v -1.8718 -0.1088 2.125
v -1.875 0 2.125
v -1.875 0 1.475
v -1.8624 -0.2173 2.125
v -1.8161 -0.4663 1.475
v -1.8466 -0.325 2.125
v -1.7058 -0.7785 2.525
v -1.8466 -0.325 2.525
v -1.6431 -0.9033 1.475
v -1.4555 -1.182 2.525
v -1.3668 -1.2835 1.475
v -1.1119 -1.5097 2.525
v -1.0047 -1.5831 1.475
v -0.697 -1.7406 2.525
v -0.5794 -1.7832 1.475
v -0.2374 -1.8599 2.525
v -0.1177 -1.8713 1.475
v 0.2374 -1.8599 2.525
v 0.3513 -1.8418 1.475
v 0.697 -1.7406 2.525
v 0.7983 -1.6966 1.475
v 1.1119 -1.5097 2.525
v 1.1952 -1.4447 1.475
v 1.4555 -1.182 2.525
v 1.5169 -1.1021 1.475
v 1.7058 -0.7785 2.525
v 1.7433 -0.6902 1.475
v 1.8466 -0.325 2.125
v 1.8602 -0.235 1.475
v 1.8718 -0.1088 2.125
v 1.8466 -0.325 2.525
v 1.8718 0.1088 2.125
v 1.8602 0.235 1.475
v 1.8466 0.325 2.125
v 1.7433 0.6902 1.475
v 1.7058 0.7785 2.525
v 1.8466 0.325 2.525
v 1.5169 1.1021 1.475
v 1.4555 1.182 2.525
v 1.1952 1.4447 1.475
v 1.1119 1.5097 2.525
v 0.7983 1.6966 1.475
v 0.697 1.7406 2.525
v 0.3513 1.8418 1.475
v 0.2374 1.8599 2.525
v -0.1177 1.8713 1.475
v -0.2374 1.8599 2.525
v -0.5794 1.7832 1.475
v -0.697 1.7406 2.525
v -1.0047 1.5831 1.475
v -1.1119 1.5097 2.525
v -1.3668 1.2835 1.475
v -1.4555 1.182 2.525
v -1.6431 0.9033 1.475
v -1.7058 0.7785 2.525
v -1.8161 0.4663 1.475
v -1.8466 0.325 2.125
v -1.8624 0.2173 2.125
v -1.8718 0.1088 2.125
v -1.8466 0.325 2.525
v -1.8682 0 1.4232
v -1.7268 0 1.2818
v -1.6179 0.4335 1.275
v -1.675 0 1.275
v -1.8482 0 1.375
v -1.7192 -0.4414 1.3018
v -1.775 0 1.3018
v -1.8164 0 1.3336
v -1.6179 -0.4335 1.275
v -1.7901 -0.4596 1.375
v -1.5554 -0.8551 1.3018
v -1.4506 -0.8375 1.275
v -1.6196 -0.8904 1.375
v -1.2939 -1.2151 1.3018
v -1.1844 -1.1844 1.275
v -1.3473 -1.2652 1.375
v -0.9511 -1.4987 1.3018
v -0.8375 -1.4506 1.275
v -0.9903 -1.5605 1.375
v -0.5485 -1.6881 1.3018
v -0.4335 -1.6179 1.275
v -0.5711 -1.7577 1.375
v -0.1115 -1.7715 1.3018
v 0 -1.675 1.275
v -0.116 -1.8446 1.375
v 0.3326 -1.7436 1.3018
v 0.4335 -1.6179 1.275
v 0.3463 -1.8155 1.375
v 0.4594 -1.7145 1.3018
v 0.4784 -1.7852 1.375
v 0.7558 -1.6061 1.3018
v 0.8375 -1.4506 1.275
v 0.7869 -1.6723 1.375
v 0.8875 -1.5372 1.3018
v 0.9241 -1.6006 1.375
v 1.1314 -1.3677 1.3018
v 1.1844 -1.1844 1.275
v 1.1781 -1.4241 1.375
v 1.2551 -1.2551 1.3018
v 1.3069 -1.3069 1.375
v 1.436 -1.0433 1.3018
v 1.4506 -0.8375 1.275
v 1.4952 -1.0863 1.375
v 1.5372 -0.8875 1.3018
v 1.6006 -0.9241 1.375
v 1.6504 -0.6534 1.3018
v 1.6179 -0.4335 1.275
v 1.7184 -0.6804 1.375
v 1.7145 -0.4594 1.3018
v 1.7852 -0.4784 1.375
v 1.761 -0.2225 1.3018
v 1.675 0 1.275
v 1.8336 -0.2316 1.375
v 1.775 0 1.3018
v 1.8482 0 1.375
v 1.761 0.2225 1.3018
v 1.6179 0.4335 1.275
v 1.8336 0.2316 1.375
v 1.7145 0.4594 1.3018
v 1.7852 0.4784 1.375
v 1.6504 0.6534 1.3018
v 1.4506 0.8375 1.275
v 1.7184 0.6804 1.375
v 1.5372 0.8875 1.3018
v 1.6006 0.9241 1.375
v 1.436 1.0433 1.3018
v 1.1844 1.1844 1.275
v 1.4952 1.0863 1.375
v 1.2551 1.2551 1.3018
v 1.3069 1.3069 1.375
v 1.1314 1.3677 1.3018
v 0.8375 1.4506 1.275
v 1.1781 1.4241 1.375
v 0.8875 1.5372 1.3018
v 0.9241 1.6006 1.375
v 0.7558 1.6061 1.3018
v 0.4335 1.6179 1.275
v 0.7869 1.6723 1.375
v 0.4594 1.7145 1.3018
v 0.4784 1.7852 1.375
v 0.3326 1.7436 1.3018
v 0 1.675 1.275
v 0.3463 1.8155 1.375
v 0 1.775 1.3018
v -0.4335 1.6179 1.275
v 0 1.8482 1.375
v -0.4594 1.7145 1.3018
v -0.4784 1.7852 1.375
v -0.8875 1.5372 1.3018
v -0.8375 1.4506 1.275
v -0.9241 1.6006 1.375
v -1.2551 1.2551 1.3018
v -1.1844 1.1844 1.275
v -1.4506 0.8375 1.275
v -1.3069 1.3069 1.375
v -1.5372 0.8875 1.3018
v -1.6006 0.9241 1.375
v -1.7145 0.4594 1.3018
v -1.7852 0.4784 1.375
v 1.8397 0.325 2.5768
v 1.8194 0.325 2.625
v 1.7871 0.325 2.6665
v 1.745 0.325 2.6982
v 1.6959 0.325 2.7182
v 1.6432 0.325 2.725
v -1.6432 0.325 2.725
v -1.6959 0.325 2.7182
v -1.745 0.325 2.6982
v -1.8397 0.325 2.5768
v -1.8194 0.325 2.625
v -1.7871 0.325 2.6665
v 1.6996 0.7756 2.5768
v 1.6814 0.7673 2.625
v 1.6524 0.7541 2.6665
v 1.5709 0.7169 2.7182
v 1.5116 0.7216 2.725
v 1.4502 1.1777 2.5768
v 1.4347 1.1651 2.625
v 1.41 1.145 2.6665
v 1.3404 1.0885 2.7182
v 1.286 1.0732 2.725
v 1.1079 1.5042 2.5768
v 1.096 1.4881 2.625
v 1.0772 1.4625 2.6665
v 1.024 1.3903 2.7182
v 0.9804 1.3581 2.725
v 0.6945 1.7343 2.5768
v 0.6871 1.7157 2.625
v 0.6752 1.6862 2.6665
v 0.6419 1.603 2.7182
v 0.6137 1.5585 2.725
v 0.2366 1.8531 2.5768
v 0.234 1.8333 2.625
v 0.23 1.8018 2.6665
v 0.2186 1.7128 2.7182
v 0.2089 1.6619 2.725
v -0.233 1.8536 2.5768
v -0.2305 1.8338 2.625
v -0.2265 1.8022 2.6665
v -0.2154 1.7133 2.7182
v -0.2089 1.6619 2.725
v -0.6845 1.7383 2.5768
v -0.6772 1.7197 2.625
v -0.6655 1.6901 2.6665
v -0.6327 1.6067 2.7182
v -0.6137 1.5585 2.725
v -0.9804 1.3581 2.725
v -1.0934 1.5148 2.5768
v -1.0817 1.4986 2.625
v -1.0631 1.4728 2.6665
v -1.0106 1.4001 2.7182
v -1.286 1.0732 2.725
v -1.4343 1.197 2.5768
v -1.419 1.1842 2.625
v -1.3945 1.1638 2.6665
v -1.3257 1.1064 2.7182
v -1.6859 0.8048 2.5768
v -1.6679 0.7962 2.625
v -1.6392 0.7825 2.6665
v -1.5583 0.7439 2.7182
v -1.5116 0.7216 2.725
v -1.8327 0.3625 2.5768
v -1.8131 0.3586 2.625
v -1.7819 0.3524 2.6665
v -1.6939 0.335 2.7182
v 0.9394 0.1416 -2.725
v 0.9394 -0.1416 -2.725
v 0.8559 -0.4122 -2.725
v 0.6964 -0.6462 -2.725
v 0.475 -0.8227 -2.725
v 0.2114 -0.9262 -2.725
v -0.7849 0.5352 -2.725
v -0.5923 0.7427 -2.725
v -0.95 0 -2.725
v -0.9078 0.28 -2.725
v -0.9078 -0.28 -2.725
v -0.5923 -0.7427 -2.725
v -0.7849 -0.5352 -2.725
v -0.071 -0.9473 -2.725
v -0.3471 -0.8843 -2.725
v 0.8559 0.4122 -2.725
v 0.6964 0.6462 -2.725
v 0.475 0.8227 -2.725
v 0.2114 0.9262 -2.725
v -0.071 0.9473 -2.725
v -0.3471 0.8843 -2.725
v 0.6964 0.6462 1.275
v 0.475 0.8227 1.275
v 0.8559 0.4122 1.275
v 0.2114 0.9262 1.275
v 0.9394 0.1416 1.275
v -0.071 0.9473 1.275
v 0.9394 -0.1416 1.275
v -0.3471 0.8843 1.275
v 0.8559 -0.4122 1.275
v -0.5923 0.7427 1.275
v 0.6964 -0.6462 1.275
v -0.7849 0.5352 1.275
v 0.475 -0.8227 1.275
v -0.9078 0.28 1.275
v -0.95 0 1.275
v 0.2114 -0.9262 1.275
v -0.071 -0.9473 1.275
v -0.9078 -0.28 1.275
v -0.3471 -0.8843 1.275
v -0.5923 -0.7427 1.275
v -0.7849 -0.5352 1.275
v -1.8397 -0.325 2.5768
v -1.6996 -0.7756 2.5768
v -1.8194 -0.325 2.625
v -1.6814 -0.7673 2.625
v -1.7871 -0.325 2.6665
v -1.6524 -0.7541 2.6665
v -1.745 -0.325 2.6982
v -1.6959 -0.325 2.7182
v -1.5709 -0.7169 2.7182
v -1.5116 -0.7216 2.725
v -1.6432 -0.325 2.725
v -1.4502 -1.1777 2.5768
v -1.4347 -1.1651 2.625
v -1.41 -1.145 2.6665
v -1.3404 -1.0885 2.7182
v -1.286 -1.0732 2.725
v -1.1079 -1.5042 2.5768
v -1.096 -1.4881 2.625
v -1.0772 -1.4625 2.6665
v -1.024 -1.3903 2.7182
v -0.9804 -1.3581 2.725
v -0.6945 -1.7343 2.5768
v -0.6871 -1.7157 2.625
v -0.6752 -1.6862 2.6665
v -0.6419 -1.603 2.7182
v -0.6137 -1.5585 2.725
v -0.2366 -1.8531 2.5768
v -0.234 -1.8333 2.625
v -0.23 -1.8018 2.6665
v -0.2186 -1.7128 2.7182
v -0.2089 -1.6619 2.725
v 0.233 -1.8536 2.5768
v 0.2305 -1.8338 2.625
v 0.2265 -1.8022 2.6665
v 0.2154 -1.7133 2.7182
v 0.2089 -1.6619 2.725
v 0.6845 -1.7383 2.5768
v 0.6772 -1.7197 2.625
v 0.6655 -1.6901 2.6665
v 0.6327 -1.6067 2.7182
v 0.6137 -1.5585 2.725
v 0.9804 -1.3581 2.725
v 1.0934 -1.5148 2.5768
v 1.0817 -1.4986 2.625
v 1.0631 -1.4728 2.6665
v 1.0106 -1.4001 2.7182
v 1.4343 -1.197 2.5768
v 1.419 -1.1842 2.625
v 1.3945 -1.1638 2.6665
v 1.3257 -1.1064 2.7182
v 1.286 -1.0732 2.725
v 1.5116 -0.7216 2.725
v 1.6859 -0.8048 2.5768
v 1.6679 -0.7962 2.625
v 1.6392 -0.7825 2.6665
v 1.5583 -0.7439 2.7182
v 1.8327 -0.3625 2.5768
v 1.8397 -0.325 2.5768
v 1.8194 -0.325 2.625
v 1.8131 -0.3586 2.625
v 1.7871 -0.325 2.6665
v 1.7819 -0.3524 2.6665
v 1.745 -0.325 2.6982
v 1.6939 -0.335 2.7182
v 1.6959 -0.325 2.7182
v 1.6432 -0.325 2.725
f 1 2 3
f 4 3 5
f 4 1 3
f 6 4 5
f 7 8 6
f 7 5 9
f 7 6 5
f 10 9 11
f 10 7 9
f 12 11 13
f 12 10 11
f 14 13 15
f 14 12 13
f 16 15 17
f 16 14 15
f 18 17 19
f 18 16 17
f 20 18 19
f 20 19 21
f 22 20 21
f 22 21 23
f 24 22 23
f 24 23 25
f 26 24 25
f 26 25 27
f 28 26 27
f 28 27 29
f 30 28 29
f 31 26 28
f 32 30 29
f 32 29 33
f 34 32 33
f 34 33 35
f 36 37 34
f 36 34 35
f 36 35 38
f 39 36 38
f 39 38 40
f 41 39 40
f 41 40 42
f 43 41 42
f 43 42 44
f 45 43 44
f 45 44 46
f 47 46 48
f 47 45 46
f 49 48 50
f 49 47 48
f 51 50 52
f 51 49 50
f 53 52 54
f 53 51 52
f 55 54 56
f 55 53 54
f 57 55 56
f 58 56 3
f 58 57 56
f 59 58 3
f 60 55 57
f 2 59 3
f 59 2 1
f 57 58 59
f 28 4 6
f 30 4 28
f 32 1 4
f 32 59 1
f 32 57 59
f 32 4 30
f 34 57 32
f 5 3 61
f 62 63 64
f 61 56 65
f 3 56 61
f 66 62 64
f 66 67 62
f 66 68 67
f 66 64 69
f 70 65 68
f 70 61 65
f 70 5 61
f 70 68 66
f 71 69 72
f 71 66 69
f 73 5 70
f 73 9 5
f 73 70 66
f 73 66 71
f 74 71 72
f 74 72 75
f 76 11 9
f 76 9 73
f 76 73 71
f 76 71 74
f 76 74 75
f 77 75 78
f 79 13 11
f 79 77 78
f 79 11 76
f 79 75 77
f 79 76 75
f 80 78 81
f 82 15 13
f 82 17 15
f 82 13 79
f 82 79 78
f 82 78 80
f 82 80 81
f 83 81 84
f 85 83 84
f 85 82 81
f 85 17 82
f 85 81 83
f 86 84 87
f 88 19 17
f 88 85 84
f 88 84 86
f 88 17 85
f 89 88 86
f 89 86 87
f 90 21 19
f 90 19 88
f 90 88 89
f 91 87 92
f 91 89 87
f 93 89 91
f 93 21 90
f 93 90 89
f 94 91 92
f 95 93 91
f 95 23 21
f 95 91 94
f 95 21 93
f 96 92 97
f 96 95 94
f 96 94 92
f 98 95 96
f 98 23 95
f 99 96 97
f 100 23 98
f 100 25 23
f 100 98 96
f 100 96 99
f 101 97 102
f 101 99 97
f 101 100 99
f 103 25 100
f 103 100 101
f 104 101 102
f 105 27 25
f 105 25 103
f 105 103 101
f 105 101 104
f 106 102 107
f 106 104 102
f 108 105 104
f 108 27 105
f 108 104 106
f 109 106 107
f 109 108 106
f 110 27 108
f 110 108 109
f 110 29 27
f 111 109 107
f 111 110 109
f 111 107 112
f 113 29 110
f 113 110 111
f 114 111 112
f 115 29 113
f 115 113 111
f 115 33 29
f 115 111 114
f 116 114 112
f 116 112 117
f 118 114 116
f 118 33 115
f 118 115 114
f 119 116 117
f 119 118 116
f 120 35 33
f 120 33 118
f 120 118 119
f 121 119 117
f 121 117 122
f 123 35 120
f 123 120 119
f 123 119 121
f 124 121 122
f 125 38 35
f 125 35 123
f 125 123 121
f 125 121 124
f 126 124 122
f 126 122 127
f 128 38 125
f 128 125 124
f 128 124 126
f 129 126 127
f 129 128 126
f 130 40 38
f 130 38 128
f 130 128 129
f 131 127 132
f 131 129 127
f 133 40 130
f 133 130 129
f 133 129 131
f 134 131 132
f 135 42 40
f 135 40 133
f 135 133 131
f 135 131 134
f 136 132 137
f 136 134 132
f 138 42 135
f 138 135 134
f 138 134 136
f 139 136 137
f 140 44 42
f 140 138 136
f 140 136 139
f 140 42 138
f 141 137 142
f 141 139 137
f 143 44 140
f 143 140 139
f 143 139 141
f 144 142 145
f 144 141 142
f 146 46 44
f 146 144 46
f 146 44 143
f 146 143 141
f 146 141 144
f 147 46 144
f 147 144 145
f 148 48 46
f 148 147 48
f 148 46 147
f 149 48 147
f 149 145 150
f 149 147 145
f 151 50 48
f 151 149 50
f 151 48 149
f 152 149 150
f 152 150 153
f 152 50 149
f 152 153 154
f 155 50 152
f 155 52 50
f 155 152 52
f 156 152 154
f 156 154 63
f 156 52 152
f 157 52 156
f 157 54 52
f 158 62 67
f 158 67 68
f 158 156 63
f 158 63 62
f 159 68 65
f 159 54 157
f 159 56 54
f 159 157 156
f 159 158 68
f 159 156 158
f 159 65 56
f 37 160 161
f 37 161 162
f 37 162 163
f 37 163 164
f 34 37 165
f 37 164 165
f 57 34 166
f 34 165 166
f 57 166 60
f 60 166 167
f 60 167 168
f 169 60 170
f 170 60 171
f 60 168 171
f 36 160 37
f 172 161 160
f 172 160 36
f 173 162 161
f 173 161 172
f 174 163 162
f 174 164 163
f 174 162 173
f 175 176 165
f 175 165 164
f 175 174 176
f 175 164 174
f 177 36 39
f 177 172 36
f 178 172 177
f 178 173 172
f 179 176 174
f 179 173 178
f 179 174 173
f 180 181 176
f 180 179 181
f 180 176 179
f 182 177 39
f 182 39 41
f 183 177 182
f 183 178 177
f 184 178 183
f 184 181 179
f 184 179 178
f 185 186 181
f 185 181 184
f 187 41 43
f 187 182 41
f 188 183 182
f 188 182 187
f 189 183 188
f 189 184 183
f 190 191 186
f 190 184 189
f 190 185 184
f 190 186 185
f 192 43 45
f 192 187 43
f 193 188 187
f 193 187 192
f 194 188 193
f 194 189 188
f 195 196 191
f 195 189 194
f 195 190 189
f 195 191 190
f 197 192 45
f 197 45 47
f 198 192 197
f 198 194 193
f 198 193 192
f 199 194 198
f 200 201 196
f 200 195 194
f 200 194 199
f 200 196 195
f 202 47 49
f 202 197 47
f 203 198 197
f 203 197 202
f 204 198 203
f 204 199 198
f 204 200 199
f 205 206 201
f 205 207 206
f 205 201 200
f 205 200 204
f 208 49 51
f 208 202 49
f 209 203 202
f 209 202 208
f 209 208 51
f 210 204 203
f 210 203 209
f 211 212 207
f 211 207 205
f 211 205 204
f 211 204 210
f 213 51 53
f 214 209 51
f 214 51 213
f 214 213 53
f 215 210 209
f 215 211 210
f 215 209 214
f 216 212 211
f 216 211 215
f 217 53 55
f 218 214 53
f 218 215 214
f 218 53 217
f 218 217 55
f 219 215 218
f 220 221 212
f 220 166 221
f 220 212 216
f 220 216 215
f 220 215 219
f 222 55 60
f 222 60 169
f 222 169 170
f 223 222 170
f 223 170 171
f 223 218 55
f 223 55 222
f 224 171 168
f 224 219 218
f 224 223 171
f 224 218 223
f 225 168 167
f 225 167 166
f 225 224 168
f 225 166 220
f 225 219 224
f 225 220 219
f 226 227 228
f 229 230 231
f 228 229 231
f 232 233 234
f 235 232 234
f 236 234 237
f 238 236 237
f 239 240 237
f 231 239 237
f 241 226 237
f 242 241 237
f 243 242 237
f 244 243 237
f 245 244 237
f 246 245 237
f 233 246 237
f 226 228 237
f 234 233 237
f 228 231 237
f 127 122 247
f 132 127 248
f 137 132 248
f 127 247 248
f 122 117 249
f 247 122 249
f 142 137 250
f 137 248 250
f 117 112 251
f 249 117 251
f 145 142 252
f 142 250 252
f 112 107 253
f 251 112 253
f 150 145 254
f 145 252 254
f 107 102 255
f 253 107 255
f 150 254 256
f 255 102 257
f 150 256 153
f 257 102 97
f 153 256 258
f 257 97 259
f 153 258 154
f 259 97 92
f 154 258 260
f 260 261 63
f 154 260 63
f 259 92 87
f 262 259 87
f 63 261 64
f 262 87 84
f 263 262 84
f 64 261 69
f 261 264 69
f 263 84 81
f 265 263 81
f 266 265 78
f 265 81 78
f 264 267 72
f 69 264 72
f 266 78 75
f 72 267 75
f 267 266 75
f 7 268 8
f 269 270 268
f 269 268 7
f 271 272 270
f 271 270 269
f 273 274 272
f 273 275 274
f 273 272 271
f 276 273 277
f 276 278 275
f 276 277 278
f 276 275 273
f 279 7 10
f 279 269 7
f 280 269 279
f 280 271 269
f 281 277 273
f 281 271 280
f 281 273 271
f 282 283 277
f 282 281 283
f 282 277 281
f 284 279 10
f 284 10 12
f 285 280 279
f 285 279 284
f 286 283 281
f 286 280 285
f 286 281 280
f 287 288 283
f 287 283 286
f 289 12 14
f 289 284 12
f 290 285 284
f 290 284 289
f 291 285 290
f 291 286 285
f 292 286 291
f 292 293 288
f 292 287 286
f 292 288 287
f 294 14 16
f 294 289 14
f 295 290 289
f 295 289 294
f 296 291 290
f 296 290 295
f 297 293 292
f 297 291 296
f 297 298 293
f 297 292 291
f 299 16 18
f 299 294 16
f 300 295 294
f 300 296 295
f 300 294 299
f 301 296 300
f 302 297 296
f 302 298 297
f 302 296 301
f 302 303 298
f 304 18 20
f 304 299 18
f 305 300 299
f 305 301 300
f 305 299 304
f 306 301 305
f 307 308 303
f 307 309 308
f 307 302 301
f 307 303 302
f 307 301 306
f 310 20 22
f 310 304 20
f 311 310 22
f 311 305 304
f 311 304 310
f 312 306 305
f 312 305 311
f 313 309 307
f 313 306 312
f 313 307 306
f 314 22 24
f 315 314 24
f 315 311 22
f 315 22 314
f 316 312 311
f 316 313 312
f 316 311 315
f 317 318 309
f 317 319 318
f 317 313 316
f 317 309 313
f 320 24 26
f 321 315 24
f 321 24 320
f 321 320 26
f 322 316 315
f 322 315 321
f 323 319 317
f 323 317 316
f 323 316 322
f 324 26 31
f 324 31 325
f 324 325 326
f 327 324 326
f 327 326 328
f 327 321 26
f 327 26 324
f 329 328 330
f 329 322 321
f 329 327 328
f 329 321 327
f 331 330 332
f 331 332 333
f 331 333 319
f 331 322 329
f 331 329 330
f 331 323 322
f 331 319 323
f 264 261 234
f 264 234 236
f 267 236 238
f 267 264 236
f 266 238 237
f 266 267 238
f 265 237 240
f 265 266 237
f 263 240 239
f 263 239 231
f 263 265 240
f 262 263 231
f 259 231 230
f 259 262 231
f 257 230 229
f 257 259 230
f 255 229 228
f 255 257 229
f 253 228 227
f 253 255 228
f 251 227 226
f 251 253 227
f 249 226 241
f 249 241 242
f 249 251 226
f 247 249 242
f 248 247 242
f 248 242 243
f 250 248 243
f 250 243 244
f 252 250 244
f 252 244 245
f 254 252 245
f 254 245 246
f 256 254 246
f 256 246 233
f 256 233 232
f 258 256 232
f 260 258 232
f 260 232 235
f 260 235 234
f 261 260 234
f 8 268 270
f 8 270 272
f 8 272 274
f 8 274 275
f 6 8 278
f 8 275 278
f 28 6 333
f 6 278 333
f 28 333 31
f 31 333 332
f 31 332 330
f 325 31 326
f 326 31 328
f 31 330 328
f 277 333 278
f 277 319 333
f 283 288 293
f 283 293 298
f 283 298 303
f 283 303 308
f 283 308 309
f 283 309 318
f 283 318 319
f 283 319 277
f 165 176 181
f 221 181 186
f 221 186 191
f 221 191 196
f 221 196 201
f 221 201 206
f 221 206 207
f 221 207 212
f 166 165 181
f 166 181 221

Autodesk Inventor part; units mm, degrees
ref_plane "YZ Plane" through (0, 0, 0) normal (1, 0, 0) x (0, 1, 0)
ref_plane "XZ Plane" through (0, 0, 0) normal (0, 1, 0) x (-1, 0, 0)
ref_plane "XY Plane" through (0, 0, 0) normal (0, 0, 1) x (1, 0, 0)
sketch "Sketch1" plane through (0, 0, 0) normal (0, 1, 0) x (-1, 0, 0)
  line L0 (0, -3.815) -> (0, 3.815) projected
  line L1 (0, -2.725) -> (0, 2.725)
  line L2 (0, -2.725) -> (0.95, -2.725)
  line L3 (0.95, -2.725) -> (0.95, 1.275)
  line L4 (0.95, 1.275) -> (1.875, 1.275)
  line L5 (1.875, 1.275) -> (1.875, 2.725)
  line L6 (2.25, 0) -> (-0.375, 0) projected
  line L7 (0, 2.725) -> (1.875, 2.725)
  point P0 (0, 0)
  dimension "d0" = 4
  dimension "d1" = 1.9
  dimension "d3" = 3.75
  dimension "d4" = 1.45
revolve "Revolution1" add sketch "Sketch1" angle 360 about axis through (0, 0, -10) along (0, 0, 1)
thread "Thread2" size "M2x0.4" class "6g" standard "ANSI Metric M Profile" full length
fillet "Fillet1" radius 0.2 2 edges at (1.875, 0, 2.725) (1.875, 0, 1.275)
sketch "Sketch3" plane through (0, 0, 2.725) normal (0, 0, 1) x (1, 0, 0)
  circle A0 centre (0, 0) radius 1.875 projected
  circle A1 centre (0, 0) radius 1.875 projected
  line L0 (-2.5, -0.325) -> (2.5, -0.325)
  line L1 (2.5, -0.325) -> (2.5, 0.325)
  line L2 (2.5, 0.325) -> (-2.5, 0.325)
  line L3 (-2.5, 0.325) -> (-2.5, -0.325)
  line L4 (-2.5, -0.325) -> (2.5, 0.325) construction
  line L5 (2.5, -0.325) -> (-2.5, 0.325) construction
  dimension "d15" = 0.65
  dimension "d16" = 5
extrude "Extrusion2" cut sketch "Sketch3" against normal blind 0.6 contours A0 L0 L2 | A0 L2 L1 L0 | A0 L0 L3 L2
properties part number "empty"
